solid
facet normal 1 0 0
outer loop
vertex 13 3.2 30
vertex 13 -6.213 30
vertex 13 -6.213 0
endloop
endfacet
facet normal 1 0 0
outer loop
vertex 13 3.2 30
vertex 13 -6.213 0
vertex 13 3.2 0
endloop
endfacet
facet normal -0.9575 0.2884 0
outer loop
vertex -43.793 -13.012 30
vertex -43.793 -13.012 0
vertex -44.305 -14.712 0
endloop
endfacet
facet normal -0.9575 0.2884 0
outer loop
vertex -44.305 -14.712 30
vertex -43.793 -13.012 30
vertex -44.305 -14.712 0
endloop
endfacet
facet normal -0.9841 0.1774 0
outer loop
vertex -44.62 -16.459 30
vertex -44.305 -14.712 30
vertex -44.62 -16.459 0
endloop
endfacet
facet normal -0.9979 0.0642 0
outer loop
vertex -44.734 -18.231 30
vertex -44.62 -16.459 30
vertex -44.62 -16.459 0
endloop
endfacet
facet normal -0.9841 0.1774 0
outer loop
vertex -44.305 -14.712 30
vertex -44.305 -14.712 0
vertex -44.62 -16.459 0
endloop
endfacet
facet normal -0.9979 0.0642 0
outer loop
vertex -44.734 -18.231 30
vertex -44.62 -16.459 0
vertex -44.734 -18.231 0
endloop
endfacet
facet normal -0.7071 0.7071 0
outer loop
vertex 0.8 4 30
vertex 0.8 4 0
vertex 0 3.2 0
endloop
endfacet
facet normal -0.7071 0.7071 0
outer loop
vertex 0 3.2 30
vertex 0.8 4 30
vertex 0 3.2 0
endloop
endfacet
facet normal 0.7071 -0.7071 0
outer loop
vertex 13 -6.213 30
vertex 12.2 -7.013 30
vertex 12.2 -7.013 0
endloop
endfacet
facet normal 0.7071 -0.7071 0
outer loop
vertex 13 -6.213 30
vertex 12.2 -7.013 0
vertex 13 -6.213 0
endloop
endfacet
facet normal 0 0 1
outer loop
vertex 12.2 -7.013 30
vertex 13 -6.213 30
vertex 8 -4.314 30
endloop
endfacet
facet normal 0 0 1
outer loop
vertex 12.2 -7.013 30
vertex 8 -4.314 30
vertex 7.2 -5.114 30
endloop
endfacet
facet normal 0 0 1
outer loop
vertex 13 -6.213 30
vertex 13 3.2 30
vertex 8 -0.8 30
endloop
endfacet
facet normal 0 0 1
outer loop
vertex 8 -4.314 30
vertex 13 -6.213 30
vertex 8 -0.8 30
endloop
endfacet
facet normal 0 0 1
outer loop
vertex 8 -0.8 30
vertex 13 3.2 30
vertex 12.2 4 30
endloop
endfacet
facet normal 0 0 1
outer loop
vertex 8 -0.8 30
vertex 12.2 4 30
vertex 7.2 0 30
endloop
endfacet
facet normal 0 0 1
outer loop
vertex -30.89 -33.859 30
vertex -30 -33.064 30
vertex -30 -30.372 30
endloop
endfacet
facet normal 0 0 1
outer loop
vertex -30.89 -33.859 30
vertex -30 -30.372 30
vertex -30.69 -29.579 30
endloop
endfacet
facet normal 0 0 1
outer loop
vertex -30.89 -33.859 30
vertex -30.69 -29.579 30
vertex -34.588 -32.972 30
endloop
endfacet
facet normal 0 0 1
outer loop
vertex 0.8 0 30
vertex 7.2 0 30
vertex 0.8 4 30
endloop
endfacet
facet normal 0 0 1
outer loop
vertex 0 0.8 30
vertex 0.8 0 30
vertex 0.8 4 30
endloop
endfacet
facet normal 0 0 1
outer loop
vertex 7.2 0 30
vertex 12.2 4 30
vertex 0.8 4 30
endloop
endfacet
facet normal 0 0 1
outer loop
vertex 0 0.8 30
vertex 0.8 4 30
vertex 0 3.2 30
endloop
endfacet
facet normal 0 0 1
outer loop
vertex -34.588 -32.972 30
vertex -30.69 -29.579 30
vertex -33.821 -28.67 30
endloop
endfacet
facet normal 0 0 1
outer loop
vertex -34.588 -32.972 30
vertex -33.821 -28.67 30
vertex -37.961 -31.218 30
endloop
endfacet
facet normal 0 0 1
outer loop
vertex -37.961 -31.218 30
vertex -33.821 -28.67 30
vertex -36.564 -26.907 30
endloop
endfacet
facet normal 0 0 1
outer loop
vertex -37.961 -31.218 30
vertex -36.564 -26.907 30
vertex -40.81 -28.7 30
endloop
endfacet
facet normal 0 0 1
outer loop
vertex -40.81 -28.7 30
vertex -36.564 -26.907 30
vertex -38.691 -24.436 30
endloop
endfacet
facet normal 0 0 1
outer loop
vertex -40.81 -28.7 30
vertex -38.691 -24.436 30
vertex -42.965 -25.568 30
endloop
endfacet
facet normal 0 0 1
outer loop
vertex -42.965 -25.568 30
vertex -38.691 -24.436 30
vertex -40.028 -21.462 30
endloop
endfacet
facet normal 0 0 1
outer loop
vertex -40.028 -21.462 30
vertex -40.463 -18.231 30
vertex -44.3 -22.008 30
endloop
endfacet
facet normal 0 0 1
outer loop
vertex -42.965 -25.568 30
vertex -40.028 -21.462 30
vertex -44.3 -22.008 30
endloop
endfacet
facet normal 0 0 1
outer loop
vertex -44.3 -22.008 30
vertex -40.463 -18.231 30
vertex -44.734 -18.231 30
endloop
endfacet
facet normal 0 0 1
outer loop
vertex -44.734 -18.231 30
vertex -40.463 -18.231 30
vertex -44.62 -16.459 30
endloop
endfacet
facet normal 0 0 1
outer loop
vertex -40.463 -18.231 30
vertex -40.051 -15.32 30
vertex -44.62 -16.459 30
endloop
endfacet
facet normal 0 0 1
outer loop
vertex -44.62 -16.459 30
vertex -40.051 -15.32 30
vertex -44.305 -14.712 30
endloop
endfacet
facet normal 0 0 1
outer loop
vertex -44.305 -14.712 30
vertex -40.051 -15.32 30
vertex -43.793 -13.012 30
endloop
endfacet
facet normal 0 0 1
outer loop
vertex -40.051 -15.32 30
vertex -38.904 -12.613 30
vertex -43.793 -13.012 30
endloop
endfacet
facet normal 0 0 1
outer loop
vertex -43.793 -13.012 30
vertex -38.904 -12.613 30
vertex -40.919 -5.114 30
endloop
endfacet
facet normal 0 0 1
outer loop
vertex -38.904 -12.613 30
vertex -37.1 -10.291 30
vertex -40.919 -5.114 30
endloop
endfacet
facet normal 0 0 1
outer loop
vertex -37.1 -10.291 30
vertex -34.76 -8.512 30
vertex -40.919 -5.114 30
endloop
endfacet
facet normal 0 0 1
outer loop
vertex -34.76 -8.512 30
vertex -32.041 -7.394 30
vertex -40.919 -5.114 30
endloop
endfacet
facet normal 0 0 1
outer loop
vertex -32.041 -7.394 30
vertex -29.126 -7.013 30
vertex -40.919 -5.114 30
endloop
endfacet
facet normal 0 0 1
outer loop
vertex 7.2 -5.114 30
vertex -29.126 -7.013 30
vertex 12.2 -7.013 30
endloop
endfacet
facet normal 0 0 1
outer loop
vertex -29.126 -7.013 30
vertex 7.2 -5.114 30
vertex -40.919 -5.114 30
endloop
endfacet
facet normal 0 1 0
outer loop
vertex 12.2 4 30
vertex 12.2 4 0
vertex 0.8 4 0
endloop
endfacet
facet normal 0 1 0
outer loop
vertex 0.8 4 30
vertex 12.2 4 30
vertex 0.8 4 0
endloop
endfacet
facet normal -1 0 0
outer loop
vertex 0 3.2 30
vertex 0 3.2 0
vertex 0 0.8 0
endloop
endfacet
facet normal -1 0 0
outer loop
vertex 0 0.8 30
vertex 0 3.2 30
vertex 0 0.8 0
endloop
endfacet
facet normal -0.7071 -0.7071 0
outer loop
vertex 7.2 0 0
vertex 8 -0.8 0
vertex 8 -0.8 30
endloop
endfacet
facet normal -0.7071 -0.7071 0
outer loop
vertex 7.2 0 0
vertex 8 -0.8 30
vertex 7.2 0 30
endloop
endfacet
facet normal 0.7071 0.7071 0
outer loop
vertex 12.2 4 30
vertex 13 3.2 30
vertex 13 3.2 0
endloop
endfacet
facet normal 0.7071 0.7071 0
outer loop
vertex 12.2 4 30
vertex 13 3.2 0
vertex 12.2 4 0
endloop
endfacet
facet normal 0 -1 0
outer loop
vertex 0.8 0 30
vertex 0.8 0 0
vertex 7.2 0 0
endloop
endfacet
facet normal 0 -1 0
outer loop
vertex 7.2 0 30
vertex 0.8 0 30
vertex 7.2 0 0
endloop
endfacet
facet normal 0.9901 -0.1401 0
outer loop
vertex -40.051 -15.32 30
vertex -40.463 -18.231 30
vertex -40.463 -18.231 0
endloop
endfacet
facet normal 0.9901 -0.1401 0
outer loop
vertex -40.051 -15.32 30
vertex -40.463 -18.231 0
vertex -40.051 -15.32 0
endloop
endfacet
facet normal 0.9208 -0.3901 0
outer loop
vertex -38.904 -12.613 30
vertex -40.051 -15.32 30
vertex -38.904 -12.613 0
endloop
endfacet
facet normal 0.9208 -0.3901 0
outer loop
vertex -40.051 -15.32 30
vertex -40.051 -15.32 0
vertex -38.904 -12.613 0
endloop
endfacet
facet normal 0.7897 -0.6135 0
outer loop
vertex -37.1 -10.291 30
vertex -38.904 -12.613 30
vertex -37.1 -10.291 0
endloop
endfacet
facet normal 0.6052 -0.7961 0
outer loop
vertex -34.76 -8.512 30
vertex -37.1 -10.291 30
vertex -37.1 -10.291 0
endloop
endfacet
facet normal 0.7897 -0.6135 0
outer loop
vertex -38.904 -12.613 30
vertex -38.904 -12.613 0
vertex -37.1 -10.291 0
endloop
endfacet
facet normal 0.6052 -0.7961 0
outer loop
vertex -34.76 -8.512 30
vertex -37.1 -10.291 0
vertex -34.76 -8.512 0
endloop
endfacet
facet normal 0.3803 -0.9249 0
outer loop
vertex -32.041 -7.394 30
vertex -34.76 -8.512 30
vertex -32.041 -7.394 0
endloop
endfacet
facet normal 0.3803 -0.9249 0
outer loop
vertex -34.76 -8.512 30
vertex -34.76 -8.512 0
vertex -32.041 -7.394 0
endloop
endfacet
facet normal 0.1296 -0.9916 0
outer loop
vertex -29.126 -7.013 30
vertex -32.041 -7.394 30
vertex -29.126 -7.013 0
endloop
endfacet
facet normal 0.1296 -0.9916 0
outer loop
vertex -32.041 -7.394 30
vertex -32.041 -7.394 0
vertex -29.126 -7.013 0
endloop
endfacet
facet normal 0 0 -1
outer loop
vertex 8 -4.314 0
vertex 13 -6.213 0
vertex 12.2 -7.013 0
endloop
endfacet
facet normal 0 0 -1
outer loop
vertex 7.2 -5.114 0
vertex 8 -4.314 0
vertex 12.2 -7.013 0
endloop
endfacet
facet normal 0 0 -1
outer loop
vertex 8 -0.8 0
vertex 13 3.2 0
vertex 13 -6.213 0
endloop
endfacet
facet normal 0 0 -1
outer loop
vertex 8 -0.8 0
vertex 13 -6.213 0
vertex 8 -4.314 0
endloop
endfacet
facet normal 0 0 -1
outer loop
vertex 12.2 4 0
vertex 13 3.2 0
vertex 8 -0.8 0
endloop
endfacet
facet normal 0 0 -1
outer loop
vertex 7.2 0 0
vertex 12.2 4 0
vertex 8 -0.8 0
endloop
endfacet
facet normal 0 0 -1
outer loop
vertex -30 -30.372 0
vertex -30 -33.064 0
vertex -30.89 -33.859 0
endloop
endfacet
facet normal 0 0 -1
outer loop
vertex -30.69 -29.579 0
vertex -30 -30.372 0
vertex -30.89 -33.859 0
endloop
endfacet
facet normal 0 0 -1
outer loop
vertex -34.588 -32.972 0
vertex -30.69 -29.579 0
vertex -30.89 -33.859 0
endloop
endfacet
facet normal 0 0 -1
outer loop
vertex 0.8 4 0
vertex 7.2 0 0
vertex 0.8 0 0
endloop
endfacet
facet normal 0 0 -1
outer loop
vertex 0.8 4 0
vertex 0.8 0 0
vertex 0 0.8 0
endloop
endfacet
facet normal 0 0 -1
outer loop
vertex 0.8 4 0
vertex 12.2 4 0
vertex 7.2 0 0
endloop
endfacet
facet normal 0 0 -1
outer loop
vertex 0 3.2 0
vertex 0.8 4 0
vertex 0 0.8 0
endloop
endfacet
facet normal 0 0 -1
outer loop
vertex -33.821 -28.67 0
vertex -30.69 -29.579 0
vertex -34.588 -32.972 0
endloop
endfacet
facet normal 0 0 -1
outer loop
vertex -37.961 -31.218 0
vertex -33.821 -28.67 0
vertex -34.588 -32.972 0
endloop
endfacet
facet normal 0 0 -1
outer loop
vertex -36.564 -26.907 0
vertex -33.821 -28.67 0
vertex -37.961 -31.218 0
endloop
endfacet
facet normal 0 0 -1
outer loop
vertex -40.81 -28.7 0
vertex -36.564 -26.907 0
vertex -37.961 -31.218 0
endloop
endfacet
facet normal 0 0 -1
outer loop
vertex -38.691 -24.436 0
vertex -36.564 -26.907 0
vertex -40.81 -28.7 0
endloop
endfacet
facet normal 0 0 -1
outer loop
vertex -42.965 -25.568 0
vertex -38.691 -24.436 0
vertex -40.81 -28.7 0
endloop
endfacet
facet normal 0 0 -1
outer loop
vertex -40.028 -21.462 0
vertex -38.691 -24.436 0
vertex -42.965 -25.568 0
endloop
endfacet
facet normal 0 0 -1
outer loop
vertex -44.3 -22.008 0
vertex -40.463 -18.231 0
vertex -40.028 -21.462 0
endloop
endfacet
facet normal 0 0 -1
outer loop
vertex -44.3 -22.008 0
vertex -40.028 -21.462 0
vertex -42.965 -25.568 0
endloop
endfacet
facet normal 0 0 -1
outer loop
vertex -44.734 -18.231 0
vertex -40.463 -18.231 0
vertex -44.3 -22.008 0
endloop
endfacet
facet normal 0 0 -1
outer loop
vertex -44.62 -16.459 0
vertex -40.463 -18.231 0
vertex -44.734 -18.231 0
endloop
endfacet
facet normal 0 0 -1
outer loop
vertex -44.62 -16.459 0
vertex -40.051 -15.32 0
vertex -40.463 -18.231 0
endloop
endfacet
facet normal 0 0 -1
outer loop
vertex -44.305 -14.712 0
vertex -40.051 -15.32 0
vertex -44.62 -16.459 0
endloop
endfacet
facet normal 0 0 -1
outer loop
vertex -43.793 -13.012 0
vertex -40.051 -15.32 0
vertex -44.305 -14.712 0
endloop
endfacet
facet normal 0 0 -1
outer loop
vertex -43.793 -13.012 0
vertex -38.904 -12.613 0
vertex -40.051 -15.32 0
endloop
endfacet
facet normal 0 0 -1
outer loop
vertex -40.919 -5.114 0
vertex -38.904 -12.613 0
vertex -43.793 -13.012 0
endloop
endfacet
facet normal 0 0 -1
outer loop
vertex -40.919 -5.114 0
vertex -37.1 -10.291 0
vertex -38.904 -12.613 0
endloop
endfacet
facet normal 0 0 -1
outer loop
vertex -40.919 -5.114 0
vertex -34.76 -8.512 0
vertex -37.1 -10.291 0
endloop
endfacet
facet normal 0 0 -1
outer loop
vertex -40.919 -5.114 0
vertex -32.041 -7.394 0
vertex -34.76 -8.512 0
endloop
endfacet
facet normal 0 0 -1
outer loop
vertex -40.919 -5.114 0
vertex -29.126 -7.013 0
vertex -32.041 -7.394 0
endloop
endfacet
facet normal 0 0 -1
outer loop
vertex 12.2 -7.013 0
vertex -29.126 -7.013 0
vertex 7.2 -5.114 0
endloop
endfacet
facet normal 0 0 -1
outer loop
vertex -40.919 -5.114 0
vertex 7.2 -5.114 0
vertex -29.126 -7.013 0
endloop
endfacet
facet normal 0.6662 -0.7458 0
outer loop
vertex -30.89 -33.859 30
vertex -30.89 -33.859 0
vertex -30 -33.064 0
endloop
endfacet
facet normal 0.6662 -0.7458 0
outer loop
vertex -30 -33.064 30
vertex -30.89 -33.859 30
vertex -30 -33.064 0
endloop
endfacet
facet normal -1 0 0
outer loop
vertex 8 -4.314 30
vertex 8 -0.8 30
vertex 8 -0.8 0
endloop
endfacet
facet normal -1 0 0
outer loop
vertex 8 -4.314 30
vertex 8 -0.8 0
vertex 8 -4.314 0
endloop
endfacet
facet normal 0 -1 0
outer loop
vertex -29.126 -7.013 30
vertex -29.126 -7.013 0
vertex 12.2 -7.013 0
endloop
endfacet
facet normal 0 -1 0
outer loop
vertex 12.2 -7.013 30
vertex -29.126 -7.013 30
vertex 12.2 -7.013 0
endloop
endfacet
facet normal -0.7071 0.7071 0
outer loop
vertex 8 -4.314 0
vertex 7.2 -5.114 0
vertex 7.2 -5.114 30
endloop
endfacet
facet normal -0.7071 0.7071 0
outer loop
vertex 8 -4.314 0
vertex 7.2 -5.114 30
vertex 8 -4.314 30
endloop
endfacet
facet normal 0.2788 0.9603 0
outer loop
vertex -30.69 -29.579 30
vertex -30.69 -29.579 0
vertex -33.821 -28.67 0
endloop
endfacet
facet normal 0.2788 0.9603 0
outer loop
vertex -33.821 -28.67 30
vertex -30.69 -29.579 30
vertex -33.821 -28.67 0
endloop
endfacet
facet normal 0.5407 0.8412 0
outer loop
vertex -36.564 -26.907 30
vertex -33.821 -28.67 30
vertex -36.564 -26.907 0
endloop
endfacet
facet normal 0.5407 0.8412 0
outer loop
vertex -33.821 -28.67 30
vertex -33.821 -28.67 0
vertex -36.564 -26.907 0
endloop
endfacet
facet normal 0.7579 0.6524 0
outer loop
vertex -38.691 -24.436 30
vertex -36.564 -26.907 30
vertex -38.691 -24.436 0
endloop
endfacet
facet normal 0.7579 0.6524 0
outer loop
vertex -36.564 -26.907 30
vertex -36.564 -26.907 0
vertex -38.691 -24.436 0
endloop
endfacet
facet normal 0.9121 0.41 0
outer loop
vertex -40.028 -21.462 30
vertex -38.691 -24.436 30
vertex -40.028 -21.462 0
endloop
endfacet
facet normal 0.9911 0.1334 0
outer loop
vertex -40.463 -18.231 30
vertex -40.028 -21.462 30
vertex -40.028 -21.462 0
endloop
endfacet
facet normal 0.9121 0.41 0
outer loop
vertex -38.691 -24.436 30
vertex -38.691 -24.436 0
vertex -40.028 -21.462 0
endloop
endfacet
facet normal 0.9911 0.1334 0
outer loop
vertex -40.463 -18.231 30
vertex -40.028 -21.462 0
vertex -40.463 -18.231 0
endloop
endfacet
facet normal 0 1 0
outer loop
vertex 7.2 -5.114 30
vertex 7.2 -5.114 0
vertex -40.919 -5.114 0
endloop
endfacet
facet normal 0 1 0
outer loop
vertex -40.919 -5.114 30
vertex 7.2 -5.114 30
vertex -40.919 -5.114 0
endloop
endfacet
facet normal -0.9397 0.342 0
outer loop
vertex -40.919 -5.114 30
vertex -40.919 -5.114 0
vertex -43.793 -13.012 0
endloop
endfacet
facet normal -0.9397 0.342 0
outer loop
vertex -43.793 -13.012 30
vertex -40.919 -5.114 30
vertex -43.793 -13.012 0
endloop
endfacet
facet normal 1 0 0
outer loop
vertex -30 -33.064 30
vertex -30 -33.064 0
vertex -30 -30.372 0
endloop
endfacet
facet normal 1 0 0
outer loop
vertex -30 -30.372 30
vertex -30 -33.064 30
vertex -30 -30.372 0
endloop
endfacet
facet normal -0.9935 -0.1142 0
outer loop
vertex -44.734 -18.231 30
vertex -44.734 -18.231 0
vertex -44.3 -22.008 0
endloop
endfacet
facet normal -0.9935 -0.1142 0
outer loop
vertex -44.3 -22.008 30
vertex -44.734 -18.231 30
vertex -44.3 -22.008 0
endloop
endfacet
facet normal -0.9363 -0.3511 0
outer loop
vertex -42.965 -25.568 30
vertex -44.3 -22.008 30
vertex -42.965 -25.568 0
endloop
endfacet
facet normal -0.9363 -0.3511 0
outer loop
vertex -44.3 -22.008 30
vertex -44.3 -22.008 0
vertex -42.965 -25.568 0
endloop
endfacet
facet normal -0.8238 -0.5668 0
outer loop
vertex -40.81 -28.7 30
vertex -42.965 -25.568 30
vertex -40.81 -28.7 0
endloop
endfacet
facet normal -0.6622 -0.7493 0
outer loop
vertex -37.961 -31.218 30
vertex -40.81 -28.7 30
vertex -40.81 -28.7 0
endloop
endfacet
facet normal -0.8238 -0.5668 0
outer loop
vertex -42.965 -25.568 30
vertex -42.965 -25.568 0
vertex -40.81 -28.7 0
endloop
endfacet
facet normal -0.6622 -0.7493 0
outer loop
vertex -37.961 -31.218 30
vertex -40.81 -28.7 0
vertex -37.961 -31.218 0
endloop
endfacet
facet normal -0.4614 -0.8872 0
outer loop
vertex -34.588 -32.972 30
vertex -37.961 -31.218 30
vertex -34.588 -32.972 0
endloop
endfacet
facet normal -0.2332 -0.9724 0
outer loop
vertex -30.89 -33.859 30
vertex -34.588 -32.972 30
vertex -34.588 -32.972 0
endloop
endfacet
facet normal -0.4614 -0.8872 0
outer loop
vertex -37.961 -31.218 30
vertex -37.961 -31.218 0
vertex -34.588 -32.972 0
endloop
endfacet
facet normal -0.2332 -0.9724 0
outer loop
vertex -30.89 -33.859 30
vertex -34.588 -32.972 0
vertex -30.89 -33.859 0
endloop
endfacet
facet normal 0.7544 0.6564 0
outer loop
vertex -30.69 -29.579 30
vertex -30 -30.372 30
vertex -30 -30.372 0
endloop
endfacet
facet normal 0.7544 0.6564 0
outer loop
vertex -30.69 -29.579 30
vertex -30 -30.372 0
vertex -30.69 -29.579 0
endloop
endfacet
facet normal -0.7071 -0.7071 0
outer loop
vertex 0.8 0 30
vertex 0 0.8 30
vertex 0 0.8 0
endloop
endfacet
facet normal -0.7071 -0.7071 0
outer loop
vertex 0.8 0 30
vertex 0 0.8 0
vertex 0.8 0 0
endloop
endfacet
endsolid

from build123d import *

# Parameters (mm, degrees)
F1_DEPTH    = 30
F2_T1_DEPTH = 30
F2_T3_DEPTH = 34.1146927807
F2_T5_DEPTH = 34.5796675935
F2_T7_DEPTH = 33.7107882322


# Not quite as in the source:
# - a fillet or chamfer that OpenCascade refuses, or shapes differently, is made with other operations: its cross-section is extruded or revolved along the edge and cut away or added


with BuildPart() as f1:
    # F0 (on Top) → F1 (new body)
    with BuildSketch(Plane.XY):
        with BuildLine():
            Line((0, 4), (0, 0))
            Line((0, 0), (8, 0))
            Line((8, 0), (8, -5.11398))
            Line((8, -5.11398), (0, -5.11398))
            Line((0, -5.11398), (-30, -5.11398))
            Line((-30, -5.11398), (-40.9191332404, -5.11398))
            Line((-40.9191332404, -5.11398), (-43.7934957599, -13.012435493))
            ThreePointArc((-43.7934957599, -13.012435493), (-44.486999636, -15.5813060668), (-44.7341086379, -18.230641982))
            ThreePointArc((-44.7341086379, -18.230641982), (-40.5087550106, -29.0303309912), (-30, -33.9347131233))
            Line((-30, -33.9347131233), (-30, -29.6540509196))
            ThreePointArc((-30, -29.6540509196), (-37.4863926883, -26.0077839606), (-40.4625312712, -18.230641982))
            ThreePointArc((-40.4625312712, -18.230641982), (-37.1000637613, -10.2912492126), (-29.125629618, -7.0127517826))
            Line((-29.125629618, -7.0127517826), (0, -7.0127517826))
            Line((0, -7.0127517826), (13, -7.0127517826))
            Line((13, -7.0127517826), (13, 4))
            Line((13, 4), (0, 4))
        make_face()
    extrude(amount=F1_DEPTH)

    # F2: chamfer of 0.8 on 8 edges, made by hand

    # F2_s2 → F2_t1 (join)
    with BuildSketch(Plane.XY):
        Polygon((8, -0.8), (7.2, 0), (8, 0), align=None)
        Polygon((7.2, -5.11398), (8, -4.31398), (8, -5.11398), align=None)
    extrude(amount=F2_T1_DEPTH)

    # F2_s4 → F2_t3 (cut)
    with BuildSketch(Plane.XY.offset(-2.0573463904)):
        Polygon((0, 0.8), (0.8, 0), (0, 0), align=None)
        Polygon((0.8, 4), (0, 3.2), (0, 4), align=None)
        Polygon((12.2, -7.0127517826), (13, -6.2127517826), (13, -7.0127517826), align=None)
        Polygon((13, 3.2), (12.2, 4), (13, 4), align=None)
    extrude(amount=F2_T3_DEPTH, mode=Mode.SUBTRACT)

    # F2_s6 → F2_t5 (cut)
    with BuildSketch(Plane.XY.offset(-2.2898337967)):
        with BuildLine():
            Line((-30.8904518842, -33.859131698), (-30, -33.0642616101))
            Line((-30, -33.0642616101), (-30, -33.9347131233))
            ThreePointArc((-30, -33.9347131233), (-30.4567158355, -33.9023630924), (-30.8904518842, -33.859131698))
        make_face()
    extrude(amount=F2_T5_DEPTH, mode=Mode.SUBTRACT)

    # F2_s8 → F2_t7 (cut)
    with BuildSketch(Plane.XY.offset(-1.8553941161)):
        with BuildLine():
            Line((-30, -30.3717734146), (-30.6896401509, -29.5794220382))
            ThreePointArc((-30.6896401509, -29.5794220382), (-30.3570806998, -29.6207408817), (-30, -29.6540509196))
            Line((-30, -29.6540509196), (-30, -30.3717734146))
        make_face()
    extrude(amount=F2_T7_DEPTH, mode=Mode.SUBTRACT)


solid = f1.part
